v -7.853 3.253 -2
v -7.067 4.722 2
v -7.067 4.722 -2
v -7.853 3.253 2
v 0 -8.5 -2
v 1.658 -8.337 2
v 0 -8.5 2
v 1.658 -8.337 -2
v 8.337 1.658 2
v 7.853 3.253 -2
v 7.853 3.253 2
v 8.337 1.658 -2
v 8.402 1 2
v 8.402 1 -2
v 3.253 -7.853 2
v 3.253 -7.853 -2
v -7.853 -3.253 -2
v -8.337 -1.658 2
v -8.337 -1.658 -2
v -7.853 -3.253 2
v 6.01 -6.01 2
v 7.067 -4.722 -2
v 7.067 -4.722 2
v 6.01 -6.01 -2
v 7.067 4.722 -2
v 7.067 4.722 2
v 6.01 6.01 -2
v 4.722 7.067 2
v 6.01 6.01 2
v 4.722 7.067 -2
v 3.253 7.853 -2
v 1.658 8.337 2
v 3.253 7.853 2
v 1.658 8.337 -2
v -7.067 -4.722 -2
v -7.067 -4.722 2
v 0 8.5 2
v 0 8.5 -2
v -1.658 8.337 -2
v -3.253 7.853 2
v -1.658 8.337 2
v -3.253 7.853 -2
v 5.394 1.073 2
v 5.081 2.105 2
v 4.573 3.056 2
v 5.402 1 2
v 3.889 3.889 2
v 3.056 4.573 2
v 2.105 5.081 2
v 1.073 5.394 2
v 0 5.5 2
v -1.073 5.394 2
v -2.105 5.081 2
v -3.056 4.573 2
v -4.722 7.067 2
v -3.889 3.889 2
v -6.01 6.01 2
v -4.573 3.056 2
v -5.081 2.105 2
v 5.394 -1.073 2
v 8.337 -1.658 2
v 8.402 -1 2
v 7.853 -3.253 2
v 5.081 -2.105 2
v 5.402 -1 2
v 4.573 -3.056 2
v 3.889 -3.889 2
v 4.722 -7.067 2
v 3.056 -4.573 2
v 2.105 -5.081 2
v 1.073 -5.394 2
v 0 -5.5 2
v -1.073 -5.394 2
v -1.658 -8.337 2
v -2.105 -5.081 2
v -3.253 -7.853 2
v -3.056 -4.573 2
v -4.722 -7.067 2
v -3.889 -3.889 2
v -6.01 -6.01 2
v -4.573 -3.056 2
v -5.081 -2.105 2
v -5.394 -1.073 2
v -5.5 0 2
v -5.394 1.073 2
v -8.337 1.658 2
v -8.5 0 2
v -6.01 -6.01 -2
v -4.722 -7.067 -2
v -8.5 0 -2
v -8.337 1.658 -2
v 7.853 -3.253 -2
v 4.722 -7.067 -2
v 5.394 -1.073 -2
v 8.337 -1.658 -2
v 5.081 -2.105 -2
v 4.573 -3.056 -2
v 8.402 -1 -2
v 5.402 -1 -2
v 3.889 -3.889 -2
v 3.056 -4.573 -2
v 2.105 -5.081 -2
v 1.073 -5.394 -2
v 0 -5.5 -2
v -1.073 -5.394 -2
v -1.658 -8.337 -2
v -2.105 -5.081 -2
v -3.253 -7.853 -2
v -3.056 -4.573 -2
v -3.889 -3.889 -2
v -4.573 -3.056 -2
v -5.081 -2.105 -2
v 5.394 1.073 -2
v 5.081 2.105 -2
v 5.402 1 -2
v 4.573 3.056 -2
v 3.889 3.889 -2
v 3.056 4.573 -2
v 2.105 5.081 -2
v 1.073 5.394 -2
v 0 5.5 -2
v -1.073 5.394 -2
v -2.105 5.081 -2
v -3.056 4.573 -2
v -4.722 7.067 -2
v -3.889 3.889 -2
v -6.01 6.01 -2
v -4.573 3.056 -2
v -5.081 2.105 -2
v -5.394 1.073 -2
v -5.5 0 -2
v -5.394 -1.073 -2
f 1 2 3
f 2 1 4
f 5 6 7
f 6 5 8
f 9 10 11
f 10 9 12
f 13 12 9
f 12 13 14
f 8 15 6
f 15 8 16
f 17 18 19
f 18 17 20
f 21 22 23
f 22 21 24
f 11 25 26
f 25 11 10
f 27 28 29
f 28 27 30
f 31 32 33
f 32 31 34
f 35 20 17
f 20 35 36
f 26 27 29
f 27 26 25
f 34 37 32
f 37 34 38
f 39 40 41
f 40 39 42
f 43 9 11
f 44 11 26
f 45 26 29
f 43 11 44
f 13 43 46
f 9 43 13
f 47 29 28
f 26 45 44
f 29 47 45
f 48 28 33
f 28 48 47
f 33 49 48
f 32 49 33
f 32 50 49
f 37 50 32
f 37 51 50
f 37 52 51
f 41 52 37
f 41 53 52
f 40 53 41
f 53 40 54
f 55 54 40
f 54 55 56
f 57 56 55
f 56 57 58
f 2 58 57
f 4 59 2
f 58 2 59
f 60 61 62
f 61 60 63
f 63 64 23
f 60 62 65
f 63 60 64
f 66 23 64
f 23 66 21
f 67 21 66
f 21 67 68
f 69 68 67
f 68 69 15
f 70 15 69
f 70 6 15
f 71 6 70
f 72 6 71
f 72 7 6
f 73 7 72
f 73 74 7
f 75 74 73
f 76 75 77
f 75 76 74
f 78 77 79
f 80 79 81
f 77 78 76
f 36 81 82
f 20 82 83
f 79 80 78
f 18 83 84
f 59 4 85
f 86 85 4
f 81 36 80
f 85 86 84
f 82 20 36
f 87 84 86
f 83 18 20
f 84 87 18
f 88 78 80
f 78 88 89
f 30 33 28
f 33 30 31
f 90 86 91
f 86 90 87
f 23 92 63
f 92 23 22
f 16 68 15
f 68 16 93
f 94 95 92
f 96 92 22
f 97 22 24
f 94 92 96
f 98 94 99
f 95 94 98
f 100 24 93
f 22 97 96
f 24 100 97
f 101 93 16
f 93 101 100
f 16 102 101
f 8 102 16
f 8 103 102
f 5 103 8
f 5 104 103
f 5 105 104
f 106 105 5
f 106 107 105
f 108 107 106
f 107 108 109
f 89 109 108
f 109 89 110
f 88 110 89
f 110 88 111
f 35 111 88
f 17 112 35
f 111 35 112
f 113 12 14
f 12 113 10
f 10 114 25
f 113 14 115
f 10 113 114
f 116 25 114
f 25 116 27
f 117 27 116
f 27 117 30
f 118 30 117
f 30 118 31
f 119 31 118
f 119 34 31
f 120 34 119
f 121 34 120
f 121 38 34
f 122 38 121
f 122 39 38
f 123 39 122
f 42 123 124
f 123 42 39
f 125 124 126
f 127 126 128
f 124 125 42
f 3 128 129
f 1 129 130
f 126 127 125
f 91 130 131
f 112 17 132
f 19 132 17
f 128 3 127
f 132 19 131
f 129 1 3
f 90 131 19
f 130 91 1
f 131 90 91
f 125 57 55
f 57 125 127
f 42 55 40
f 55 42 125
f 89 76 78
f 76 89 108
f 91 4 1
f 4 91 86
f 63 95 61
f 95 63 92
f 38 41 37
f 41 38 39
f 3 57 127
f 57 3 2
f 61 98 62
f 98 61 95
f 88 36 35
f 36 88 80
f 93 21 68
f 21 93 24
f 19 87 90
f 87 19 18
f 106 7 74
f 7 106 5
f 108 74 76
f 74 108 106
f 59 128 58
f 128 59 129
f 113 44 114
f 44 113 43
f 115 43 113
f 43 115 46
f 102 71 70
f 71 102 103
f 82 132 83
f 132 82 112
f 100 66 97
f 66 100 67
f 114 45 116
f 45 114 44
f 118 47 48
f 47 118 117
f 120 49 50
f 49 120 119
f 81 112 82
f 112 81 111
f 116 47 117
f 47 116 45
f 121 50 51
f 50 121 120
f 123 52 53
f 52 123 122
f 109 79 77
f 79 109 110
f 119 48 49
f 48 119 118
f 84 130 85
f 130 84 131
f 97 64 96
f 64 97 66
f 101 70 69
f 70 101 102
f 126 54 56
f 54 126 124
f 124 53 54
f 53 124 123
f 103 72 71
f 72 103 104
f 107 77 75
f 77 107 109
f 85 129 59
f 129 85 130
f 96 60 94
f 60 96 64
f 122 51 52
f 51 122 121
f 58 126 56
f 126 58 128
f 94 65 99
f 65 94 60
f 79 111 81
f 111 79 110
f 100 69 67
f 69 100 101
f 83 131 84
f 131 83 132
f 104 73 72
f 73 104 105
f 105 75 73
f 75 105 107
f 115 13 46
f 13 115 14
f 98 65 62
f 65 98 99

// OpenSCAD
module pen_holder(pen_d=12) { // pen_d 12 or 13 depending on placement
  tab_h = 8;
  tab_l = 10;
  tab_w = 1.6;

  pen_h = 2;
  pen_t = 3;

  pen_offset = 3;

  ff = 0.1;

  translate([-tab_l/2,0,0]) cube([tab_l, tab_w, tab_h]);
  difference() {
    hull() {
      translate([-tab_l/2,0,0]) cube([tab_l, ff, tab_h]);
      translate([0,(-(pen_d+pen_t)/2)-pen_offset,0]) cylinder(d=pen_d+pen_t, h=pen_h, $fn=32);
    }
    translate([0,(-(pen_d+pen_t)/2)-pen_offset,-ff]) cylinder(d=pen_d, h=tab_h+(ff*2), $fn=32);
  }
}

module pen_ring() {

  pen_d = 11; // deliberately too small
  pen_h = 4;
  pen_t = 6;

  ff = 0.1;

  difference() {
    cylinder(d=pen_d+pen_t, h=pen_h, center=true, $fn=32);
    cylinder(d=pen_d, h=pen_h+ff, center=true, $fn=32);
    translate([pen_d/2,0,0]) cube([pen_t*2,2,pen_h+ff], center=true);
  }

}

pen_ring();
/*pen_holder(pen_d=13);*/
